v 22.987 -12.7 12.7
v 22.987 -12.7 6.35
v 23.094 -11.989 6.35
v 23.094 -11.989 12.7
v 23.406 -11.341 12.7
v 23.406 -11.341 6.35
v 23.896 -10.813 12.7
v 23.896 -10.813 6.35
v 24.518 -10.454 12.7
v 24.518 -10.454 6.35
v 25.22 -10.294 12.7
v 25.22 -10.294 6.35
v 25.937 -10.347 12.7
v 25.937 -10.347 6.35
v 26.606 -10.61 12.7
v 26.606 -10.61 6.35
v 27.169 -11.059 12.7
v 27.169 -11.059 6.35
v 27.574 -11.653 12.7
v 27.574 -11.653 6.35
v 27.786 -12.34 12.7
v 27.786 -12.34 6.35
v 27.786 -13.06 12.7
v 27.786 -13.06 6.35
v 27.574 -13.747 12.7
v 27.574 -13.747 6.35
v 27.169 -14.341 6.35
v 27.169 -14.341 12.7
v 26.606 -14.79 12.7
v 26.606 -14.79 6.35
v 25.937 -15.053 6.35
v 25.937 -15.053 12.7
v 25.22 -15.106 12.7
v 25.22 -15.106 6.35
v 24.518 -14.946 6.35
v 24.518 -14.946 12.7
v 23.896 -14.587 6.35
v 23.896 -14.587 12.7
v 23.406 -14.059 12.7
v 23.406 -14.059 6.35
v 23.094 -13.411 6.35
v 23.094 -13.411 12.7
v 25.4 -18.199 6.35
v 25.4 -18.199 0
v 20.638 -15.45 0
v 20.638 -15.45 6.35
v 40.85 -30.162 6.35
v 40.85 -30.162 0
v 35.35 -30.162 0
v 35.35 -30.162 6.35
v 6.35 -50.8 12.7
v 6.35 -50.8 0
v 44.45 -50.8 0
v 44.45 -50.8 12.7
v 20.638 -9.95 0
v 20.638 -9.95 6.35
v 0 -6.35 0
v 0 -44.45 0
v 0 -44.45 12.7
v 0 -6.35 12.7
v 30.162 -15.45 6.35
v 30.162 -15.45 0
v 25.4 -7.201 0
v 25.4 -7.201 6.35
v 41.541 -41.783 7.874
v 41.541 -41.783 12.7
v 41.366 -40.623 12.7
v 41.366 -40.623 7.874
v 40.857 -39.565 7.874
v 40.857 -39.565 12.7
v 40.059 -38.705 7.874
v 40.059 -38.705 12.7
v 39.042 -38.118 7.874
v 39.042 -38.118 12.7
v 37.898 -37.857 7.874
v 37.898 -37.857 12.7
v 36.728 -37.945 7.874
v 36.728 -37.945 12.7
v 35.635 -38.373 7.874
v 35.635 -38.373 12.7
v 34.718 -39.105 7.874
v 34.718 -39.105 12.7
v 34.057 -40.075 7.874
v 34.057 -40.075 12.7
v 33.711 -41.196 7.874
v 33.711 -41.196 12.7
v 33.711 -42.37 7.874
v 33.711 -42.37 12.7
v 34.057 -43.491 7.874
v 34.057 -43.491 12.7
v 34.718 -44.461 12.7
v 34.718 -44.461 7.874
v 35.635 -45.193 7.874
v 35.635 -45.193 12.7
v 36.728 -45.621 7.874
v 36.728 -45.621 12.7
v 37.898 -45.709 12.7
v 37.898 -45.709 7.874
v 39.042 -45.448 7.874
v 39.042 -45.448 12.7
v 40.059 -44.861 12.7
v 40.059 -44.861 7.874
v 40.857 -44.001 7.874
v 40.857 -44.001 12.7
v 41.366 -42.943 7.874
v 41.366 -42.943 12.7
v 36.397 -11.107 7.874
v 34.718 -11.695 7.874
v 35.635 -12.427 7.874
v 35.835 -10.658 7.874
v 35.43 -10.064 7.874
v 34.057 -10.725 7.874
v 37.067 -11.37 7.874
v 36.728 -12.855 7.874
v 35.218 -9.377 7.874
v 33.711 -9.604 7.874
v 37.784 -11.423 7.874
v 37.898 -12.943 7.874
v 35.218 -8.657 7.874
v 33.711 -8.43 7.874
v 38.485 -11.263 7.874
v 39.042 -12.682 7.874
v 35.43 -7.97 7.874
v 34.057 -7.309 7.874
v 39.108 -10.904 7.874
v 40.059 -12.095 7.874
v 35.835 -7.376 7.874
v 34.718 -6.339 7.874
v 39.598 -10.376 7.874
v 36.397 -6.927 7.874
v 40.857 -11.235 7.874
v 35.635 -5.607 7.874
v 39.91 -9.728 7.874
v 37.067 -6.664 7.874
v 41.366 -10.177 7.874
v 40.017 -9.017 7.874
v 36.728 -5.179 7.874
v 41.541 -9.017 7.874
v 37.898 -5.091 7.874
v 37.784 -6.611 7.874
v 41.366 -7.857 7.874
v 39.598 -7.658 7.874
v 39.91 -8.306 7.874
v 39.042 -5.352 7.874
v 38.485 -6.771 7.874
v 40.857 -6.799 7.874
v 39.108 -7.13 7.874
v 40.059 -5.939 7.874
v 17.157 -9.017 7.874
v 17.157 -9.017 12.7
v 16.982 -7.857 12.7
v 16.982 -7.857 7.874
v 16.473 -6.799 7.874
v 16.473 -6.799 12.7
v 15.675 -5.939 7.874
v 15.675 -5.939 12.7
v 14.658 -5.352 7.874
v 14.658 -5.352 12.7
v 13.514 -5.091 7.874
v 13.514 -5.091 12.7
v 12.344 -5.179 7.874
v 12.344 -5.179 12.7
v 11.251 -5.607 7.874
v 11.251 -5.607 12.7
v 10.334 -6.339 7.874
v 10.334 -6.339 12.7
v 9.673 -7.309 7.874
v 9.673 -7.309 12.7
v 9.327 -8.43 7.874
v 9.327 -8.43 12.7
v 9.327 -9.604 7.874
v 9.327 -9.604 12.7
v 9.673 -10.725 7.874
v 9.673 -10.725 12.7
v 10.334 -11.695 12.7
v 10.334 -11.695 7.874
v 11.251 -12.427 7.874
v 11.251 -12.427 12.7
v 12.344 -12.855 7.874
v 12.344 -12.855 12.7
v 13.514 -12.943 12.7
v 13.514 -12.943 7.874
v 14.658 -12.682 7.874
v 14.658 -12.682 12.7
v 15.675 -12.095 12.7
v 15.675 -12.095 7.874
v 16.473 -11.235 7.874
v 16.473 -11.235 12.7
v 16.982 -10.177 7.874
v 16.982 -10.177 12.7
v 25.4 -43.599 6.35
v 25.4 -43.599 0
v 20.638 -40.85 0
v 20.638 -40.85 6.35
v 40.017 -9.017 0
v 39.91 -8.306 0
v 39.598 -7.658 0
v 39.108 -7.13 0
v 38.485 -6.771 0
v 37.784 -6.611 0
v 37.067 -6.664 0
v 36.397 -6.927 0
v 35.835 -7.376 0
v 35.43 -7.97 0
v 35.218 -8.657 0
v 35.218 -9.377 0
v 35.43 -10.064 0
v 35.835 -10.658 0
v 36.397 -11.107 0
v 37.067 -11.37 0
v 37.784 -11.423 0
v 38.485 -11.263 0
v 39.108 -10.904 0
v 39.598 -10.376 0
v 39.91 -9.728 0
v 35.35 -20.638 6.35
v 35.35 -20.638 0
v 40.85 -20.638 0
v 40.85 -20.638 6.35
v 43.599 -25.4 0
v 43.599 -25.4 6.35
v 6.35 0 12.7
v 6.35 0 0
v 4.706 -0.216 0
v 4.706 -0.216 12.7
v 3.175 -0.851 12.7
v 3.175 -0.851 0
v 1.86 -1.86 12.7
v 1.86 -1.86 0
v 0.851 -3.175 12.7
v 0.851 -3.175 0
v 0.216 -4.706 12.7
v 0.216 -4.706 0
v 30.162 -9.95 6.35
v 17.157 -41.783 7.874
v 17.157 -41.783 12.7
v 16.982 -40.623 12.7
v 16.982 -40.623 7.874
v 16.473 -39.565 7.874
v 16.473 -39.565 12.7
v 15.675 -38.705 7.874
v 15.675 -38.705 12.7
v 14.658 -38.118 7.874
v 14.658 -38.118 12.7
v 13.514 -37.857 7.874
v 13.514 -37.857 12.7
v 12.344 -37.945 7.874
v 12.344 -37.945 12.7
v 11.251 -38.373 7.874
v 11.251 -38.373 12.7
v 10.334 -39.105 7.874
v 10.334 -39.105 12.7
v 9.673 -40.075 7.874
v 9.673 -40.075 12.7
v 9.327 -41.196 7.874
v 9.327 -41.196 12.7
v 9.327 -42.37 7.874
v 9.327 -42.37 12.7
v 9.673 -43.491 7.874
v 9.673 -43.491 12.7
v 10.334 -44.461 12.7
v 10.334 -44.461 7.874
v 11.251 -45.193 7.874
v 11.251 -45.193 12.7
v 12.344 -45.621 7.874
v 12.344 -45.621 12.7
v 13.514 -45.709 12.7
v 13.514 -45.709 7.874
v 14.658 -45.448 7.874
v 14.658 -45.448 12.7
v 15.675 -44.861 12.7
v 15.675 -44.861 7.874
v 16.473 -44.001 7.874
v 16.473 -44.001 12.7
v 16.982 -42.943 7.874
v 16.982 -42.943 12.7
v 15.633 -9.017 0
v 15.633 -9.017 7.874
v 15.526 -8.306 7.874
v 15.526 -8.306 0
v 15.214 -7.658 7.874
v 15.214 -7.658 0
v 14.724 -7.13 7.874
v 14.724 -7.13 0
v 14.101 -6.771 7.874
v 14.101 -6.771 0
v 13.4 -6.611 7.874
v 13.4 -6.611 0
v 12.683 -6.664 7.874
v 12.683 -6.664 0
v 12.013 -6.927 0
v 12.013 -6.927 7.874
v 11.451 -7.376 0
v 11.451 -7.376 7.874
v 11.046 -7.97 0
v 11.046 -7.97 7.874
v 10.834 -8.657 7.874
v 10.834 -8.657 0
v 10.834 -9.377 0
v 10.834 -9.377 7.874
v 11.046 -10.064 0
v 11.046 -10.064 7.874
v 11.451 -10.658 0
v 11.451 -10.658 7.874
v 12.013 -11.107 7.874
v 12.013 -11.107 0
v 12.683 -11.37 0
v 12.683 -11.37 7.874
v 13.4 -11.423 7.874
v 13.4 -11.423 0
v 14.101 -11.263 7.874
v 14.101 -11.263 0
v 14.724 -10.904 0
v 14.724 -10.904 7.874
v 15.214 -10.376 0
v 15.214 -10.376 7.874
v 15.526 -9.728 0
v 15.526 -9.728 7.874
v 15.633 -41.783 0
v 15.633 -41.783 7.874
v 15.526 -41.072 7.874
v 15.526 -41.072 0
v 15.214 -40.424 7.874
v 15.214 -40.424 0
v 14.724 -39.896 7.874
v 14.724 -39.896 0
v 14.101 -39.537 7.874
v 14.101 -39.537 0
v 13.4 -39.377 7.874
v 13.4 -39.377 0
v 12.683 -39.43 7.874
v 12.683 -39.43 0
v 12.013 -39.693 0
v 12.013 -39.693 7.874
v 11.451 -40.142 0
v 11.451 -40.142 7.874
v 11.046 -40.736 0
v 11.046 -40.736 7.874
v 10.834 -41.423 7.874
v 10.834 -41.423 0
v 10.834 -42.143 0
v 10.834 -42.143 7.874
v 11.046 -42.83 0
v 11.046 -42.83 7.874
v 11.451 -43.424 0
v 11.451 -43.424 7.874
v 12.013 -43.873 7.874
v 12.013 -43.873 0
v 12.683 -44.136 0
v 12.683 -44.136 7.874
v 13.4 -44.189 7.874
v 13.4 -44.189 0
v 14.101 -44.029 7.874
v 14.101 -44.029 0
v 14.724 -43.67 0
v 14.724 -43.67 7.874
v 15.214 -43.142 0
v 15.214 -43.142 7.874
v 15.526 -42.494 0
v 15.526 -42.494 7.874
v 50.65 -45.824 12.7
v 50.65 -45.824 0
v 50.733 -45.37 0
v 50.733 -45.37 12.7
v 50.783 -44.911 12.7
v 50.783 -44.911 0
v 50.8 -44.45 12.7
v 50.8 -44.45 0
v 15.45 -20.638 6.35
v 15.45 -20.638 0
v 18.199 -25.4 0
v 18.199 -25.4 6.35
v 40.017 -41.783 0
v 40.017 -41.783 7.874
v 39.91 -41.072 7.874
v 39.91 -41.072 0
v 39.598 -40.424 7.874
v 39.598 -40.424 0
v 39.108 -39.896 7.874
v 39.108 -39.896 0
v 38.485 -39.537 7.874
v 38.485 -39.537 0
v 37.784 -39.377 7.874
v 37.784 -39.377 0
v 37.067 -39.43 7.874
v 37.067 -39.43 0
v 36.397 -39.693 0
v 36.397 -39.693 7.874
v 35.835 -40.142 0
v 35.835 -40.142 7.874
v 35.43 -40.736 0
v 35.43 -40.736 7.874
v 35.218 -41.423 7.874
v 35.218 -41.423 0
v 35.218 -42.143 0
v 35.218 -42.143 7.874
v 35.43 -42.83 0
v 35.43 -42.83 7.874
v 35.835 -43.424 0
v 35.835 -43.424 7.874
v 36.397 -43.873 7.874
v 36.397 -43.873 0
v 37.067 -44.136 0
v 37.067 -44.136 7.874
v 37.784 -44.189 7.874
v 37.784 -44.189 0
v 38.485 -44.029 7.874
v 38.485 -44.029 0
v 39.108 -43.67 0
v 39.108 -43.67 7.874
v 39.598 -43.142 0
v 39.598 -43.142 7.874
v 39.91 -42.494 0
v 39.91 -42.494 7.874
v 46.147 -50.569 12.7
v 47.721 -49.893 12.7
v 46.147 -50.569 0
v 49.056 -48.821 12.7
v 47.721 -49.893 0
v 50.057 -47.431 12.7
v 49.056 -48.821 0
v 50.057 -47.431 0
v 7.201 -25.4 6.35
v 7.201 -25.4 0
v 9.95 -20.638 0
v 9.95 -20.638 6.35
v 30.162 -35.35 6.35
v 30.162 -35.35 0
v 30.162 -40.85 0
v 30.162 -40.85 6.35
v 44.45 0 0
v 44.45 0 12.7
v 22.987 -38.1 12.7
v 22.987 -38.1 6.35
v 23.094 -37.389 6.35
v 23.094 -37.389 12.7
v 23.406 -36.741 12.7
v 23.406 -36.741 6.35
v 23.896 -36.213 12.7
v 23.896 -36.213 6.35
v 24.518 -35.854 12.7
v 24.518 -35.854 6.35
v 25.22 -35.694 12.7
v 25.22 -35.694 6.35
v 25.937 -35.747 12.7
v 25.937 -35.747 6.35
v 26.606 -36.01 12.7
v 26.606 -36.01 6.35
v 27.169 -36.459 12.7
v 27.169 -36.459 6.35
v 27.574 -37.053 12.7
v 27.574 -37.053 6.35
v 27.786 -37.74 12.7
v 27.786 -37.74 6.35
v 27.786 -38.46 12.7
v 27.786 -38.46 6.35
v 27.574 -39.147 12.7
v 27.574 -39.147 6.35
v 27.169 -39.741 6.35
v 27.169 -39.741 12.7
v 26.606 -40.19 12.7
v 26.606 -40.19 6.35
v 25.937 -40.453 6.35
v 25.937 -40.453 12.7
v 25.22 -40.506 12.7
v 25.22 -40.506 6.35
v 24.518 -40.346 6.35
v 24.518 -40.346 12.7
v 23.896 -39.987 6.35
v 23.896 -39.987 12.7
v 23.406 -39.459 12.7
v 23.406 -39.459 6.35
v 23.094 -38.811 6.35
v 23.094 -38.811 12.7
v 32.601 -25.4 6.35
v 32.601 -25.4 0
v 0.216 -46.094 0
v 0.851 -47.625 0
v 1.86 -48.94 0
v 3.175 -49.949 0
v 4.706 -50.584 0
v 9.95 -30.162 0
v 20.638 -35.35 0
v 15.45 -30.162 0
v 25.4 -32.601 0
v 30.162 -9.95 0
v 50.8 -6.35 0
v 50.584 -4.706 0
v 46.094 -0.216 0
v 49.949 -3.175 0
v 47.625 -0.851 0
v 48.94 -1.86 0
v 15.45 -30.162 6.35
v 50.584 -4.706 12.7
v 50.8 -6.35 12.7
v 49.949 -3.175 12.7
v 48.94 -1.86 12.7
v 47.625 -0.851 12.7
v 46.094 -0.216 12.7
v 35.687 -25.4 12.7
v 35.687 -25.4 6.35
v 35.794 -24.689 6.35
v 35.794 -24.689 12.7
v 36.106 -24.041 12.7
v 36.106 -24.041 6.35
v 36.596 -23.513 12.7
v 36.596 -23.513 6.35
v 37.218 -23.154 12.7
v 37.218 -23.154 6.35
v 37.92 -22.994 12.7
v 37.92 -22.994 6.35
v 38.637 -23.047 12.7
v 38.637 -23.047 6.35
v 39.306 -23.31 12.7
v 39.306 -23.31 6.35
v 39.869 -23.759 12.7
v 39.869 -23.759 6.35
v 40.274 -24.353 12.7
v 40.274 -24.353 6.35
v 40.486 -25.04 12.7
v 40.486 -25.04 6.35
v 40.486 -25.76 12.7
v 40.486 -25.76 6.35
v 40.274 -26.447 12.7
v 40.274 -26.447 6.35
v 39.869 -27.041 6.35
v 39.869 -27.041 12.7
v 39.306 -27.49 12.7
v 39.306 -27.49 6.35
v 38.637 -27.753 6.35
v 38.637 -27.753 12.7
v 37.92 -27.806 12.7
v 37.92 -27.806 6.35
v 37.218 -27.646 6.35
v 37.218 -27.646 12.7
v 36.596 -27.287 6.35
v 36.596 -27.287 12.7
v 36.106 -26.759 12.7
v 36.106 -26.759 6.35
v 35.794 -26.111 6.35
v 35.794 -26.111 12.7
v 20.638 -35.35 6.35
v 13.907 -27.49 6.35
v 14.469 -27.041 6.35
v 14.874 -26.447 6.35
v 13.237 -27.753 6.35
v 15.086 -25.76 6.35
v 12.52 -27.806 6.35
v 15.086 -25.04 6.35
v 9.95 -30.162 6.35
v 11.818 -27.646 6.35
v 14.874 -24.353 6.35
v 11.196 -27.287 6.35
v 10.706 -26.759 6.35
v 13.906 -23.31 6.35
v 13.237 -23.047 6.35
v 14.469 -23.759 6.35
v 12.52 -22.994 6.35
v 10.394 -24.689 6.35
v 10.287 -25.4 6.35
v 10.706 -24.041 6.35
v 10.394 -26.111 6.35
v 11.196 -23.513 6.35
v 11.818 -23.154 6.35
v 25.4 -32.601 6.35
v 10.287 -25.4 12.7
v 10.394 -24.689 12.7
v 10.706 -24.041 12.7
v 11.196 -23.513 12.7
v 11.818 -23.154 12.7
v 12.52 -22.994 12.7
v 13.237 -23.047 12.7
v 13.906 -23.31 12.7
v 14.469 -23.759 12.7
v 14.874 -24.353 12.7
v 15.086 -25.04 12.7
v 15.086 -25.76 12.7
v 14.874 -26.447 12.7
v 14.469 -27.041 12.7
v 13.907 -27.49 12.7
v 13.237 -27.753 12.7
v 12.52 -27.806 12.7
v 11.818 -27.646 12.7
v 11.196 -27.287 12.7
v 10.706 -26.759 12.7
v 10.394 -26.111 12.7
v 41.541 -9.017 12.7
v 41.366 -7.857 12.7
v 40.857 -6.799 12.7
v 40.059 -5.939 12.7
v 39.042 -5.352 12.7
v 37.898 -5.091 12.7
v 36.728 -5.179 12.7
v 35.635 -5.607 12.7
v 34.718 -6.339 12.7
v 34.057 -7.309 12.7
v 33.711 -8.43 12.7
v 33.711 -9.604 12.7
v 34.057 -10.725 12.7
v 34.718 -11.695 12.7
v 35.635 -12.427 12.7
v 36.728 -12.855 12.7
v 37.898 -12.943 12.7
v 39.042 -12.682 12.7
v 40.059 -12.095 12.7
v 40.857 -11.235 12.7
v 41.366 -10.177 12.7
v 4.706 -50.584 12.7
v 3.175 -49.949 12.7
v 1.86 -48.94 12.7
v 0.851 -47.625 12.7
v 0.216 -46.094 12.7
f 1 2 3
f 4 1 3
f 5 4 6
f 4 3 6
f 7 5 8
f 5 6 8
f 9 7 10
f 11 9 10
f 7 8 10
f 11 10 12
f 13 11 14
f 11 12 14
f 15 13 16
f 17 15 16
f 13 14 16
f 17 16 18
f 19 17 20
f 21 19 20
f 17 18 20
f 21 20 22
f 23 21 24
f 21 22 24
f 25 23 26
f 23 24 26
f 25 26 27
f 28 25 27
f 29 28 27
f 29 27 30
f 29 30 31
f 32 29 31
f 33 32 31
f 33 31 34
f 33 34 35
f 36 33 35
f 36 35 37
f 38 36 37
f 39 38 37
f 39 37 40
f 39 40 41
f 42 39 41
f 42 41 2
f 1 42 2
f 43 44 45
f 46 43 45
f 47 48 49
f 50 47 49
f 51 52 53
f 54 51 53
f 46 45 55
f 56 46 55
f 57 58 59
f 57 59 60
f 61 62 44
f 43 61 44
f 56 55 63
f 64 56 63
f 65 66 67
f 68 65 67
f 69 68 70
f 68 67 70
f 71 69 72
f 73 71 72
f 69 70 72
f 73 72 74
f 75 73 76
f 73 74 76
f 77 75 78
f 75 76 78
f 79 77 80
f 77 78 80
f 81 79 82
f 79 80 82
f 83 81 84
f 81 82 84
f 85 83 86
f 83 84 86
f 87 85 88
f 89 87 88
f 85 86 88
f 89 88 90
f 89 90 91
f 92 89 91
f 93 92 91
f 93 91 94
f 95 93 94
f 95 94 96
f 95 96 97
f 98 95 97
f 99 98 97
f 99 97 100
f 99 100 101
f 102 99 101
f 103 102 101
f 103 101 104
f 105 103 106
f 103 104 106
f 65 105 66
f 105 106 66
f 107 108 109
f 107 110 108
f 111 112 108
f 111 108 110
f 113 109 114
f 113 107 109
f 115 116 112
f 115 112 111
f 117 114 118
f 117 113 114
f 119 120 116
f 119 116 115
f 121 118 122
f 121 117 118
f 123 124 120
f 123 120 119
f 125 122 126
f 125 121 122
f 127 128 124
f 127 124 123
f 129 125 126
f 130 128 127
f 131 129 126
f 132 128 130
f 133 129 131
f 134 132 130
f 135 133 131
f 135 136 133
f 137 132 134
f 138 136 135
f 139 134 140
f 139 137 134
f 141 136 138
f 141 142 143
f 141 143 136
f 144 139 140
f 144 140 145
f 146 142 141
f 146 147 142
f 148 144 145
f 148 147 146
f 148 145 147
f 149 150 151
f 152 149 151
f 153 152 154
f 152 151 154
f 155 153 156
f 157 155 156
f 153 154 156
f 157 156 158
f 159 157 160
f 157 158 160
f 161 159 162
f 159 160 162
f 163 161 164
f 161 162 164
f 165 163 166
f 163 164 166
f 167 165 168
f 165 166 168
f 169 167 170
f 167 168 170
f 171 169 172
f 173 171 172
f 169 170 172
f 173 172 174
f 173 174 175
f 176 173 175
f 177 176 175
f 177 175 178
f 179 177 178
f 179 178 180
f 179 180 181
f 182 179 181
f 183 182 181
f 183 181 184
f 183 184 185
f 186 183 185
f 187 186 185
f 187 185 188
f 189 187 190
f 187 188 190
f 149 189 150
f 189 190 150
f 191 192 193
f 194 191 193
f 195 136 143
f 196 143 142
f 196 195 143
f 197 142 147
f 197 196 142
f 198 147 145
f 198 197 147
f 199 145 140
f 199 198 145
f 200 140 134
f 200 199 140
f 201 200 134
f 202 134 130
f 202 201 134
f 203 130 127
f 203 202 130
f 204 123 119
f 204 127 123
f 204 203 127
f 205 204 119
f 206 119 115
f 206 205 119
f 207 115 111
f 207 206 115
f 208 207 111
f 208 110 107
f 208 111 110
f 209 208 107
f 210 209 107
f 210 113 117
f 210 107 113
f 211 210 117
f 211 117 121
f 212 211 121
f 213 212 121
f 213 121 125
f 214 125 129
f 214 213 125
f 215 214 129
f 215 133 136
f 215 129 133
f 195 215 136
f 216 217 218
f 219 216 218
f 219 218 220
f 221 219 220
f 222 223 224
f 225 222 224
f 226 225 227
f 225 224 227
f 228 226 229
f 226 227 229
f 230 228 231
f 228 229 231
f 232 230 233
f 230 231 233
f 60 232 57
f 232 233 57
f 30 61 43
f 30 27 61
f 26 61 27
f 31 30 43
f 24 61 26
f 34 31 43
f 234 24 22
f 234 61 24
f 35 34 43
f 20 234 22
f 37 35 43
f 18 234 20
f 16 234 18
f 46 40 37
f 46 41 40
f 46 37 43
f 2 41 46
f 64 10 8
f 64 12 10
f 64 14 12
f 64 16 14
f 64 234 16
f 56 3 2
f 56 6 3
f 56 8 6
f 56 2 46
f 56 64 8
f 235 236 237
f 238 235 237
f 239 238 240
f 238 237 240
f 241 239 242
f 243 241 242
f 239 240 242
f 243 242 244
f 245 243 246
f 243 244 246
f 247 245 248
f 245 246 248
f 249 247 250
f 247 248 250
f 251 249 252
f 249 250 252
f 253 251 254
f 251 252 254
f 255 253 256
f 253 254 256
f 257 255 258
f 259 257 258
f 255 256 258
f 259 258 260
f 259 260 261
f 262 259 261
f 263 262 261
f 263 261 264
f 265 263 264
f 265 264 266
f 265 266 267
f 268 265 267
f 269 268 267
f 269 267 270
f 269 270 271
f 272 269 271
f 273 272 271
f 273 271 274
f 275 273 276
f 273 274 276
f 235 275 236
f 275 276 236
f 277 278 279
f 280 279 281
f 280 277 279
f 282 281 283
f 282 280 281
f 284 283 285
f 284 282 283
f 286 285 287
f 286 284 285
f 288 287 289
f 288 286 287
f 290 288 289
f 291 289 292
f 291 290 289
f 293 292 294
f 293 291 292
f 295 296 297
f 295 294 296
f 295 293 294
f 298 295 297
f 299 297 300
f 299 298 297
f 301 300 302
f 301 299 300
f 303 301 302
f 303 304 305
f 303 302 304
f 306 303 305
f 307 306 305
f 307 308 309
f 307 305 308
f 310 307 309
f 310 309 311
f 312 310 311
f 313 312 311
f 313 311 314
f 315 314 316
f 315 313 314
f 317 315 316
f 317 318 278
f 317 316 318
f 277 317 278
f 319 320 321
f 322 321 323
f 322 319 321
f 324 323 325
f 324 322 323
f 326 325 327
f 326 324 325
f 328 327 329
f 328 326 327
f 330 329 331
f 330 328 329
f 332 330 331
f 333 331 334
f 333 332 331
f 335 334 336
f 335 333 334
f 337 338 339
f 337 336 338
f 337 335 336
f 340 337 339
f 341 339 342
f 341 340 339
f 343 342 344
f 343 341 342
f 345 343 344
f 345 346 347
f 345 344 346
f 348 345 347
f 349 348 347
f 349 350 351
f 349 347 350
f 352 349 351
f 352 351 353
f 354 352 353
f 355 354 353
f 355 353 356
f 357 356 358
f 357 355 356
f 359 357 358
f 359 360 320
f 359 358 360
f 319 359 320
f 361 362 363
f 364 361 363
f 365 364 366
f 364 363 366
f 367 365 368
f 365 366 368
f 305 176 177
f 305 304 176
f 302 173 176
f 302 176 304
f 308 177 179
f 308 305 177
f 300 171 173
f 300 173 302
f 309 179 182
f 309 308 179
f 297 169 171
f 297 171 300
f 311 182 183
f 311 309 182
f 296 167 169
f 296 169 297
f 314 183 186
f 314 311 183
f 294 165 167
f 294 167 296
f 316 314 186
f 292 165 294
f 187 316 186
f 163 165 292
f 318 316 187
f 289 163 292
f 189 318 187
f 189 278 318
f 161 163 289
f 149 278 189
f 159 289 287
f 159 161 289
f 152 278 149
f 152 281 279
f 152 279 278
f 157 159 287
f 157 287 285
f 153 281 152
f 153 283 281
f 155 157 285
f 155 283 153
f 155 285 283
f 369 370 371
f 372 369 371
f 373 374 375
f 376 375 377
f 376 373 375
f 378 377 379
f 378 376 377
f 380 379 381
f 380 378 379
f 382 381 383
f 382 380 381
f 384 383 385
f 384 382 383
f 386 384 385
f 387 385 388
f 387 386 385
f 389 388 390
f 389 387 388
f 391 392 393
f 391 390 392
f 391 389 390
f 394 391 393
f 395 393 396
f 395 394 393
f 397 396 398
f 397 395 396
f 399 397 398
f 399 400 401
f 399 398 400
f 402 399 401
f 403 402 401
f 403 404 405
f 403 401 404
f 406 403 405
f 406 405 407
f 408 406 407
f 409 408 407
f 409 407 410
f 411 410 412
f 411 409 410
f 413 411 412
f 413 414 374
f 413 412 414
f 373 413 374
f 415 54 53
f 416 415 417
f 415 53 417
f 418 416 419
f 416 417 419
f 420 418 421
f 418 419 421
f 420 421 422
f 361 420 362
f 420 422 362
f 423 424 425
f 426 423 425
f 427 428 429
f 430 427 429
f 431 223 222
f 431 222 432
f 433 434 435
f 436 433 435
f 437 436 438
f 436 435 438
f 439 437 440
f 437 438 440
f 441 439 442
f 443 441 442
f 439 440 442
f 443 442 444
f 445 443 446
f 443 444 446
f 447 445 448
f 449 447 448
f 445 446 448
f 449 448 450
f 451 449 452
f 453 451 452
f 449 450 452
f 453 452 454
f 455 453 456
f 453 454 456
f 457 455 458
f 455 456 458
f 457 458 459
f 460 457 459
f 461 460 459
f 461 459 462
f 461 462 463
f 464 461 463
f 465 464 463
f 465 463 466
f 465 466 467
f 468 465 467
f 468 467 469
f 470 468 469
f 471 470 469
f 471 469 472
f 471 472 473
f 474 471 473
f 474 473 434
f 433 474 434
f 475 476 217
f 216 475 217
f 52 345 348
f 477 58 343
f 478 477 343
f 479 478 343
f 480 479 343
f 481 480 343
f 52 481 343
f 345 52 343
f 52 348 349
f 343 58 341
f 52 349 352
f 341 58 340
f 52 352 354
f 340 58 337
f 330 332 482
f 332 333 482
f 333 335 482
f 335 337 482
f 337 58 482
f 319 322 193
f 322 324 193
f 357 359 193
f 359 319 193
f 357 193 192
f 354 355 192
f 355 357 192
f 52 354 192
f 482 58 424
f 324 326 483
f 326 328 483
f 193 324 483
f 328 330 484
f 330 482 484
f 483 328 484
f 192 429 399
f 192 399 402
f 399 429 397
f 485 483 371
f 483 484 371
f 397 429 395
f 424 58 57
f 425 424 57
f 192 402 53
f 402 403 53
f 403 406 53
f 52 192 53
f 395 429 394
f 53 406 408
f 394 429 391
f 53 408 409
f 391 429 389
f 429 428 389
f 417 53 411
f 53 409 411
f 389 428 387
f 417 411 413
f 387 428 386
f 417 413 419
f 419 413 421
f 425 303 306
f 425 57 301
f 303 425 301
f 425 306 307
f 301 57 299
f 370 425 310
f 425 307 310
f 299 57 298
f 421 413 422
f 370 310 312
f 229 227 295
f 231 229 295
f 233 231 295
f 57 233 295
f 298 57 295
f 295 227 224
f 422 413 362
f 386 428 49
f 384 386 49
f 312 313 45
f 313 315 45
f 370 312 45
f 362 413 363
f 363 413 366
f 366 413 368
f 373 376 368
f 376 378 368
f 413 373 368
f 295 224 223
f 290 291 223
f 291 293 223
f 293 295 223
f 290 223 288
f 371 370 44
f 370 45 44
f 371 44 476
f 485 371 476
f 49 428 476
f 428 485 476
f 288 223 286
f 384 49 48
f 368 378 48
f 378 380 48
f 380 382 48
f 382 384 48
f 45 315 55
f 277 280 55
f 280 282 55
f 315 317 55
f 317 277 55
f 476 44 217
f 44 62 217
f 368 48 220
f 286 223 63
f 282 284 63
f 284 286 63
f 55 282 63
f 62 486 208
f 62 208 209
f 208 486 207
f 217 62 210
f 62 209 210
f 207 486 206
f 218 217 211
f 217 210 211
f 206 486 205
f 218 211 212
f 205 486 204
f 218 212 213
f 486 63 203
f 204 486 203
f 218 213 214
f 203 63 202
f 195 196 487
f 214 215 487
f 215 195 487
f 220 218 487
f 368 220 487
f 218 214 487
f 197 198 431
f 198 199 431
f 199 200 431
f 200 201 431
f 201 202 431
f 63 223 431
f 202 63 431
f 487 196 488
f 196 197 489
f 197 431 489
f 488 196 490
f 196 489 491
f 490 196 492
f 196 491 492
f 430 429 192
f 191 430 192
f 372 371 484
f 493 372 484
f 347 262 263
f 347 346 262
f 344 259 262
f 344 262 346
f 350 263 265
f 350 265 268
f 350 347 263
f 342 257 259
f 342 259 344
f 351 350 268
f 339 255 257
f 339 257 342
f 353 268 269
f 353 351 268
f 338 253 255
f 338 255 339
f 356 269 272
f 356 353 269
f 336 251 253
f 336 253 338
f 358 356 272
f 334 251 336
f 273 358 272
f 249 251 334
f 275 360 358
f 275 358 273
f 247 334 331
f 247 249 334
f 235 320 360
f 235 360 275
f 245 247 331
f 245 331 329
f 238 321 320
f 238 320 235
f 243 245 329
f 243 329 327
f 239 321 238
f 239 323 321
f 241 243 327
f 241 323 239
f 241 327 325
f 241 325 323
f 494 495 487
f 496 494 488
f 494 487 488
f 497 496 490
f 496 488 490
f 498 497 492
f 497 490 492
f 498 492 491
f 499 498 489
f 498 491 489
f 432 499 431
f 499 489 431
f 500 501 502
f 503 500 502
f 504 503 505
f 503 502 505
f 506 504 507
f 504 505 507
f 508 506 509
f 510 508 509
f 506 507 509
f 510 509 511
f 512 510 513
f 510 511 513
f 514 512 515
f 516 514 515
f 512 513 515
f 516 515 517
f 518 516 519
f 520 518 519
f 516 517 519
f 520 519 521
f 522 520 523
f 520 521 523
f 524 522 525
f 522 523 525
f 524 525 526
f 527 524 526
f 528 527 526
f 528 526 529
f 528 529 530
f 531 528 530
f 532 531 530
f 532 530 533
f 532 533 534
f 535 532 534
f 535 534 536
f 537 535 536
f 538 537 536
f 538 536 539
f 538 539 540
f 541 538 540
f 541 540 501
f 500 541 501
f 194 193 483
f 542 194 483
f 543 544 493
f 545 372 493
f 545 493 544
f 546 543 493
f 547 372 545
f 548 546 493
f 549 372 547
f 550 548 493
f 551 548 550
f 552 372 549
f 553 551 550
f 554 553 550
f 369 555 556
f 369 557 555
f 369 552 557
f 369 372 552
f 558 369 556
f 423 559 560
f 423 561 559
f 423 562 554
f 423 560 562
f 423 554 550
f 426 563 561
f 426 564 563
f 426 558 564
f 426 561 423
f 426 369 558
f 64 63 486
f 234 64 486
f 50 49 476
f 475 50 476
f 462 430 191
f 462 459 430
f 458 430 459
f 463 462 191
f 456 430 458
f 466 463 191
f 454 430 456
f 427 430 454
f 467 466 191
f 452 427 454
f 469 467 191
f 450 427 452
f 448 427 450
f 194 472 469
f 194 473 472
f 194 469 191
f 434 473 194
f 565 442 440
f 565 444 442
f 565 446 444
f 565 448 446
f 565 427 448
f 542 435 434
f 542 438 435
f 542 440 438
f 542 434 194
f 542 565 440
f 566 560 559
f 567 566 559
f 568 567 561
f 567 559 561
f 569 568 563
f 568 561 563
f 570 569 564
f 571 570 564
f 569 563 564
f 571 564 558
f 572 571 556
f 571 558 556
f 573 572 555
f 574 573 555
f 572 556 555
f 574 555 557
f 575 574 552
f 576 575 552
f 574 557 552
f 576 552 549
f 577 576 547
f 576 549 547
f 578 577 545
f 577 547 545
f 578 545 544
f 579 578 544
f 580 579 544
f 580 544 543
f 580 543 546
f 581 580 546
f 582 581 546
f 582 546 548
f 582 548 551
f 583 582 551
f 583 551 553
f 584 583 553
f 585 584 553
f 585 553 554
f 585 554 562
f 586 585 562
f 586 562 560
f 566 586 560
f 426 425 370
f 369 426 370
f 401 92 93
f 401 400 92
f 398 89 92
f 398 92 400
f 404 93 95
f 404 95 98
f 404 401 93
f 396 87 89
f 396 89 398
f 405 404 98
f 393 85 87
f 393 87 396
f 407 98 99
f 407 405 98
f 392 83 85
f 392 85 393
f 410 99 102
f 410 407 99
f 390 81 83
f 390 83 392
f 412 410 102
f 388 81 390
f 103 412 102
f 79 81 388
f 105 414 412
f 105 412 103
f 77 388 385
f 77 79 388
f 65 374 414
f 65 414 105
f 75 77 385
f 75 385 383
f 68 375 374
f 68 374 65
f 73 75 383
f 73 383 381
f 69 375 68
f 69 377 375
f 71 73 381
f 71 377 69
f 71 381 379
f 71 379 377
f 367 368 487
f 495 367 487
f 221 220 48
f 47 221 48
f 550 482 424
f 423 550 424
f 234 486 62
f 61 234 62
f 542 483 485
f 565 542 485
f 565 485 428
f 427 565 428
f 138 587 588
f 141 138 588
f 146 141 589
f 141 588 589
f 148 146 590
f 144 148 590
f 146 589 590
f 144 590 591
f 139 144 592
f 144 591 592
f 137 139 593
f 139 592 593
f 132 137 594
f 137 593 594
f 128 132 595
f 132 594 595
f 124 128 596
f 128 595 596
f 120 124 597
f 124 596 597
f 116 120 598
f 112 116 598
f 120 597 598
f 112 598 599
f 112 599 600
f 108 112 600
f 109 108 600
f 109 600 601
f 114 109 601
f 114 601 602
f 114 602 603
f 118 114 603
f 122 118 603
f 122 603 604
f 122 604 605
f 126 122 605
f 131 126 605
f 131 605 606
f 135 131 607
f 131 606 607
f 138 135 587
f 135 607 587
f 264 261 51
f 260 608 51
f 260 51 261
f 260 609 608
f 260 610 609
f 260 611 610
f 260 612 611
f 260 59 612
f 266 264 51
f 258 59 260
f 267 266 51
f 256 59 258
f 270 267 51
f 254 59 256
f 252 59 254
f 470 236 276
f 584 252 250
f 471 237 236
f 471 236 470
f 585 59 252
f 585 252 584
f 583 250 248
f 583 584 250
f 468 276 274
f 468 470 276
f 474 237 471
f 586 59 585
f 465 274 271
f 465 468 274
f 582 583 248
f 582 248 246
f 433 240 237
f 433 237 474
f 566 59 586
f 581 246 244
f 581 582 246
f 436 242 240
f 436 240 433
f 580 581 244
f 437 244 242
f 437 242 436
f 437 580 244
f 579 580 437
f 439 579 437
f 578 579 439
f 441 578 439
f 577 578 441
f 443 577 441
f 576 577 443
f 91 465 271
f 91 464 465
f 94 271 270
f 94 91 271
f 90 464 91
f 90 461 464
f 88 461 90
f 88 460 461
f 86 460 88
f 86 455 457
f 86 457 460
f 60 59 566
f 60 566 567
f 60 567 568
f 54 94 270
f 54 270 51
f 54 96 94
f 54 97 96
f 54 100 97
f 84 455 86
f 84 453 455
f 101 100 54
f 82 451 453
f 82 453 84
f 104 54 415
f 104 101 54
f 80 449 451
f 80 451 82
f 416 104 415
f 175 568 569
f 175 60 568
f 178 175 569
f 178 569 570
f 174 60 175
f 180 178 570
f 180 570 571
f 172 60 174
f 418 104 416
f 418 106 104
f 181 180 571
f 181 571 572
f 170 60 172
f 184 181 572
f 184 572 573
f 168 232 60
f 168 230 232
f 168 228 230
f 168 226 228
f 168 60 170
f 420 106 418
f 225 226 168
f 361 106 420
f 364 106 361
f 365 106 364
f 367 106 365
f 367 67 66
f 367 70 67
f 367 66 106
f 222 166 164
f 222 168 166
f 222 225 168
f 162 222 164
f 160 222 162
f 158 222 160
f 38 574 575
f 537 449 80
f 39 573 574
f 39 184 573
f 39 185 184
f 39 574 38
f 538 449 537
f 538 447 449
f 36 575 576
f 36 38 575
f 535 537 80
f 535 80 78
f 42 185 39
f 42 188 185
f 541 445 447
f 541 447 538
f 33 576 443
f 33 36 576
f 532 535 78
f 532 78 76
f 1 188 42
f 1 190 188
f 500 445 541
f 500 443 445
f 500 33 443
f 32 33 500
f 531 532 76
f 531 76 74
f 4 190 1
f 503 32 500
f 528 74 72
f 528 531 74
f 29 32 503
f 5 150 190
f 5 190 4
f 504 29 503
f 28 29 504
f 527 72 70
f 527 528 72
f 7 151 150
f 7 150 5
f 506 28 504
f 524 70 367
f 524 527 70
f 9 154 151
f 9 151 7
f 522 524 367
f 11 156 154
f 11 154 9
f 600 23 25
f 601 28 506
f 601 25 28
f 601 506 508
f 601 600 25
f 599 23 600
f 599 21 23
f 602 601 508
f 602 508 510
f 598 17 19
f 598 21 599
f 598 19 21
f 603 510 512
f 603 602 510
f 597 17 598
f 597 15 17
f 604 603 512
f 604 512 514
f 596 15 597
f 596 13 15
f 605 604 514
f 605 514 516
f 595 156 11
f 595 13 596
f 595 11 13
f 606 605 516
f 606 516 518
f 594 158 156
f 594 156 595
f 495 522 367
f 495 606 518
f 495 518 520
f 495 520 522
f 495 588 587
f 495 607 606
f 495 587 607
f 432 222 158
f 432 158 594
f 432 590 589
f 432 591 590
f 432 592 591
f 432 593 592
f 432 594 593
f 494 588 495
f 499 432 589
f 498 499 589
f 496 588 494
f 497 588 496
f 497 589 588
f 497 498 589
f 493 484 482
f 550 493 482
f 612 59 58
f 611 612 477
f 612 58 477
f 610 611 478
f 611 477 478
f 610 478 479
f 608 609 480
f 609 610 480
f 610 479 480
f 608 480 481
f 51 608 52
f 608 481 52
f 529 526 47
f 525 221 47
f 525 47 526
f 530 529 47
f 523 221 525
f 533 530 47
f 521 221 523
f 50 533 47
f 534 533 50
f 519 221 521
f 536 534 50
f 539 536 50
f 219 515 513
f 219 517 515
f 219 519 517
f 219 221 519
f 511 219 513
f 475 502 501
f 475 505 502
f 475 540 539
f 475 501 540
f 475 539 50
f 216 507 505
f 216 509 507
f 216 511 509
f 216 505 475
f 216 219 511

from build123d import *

# Parameters (mm, degrees)
SKETCH1_W           = 50.8
SKETCH1_H           = 50.8
SKETCH1_R           = 2.413
BOSS_EXTRUDE1_DEPTH = 12.7
SKETCH2_R           = 2.413
CUT_EXTRUDE2_DEPTH  = 12.7
SKETCH7_R           = 2.413
CUT_EXTRUDE5_DEPTH  = 6.35
CUT_EXTRUDE6_DEPTH  = 73.955945611
SKETCH13_R          = 3.937
CUT_EXTRUDE7_DEPTH  = 4.826


with BuildPart() as part:
    # Sketch1 → Boss-Extrude1 (new body)
    with BuildSketch(Plane.XY):
        with Locations((25.4, -25.4)):
            Rectangle(SKETCH1_W, SKETCH1_H)
        with Locations((13.219909227, -9.017)):
            Circle(SKETCH1_R, mode=Mode.SUBTRACT)
        with Locations((37.603909227, -9.017)):
            Circle(SKETCH1_R, mode=Mode.SUBTRACT)
        with Locations((13.219909227, -41.783)):
            Circle(SKETCH1_R, mode=Mode.SUBTRACT)
        with Locations((37.603909227, -41.783)):
            Circle(SKETCH1_R, mode=Mode.SUBTRACT)
    extrude(amount=BOSS_EXTRUDE1_DEPTH)

    # Sketch2 → Cut-Extrude2 (cut)
    with BuildSketch(Plane(origin=(0, 0, 0), x_dir=(-1, 0, 0), z_dir=(0, 0, -1))):
        with Locations((-38.1, -25.4)):
            Circle(SKETCH2_R)
        with Locations((-25.4, -12.7)):
            Circle(SKETCH2_R)
        with Locations((-25.4, -38.1)):
            Circle(SKETCH2_R)
        with Locations((-12.7, -25.4)):
            Circle(SKETCH2_R)
    extrude(amount=-CUT_EXTRUDE2_DEPTH, mode=Mode.SUBTRACT)

    # Sketch7 → Cut-Extrude5 (cut)
    # profile 1 of 4: a face of its own
    with BuildSketch(Plane(origin=(0, 0, 0), x_dir=(-1, 0, 0), z_dir=(0, 0, -1))):
        Polygon((-20.6375, -40.849630657), (-20.6375, -35.350369343), (-25.4, -32.600738686), (-30.1625, -35.350369343), (-30.1625, -40.849630657), (-25.4, -43.599261314), align=None)
        with Locations((-25.4, -38.1)):
            Circle(SKETCH7_R, mode=Mode.SUBTRACT)
    # profile 2 of 4: a face of its own
    with BuildSketch(Plane(origin=(0, 0, 0), x_dir=(-1, 0, 0), z_dir=(0, 0, -1))):
        Polygon((-40.849630657, -30.1625), (-35.350369343, -30.1625), (-32.600738686, -25.4), (-35.350369343, -20.6375), (-40.849630657, -20.6375), (-43.599261314, -25.4), align=None)
        with Locations((-38.1, -25.4)):
            Circle(SKETCH7_R, mode=Mode.SUBTRACT)
    # profile 3 of 4: a face of its own
    with BuildSketch(Plane(origin=(0, 0, 0), x_dir=(-1, 0, 0), z_dir=(0, 0, -1))):
        Polygon((-9.950369343, -20.6375), (-15.449630657, -20.6375), (-18.199261314, -25.4), (-15.449630657, -30.1625), (-9.950369343, -30.1625), (-7.200738686, -25.4), align=None)
        with Locations((-12.7, -25.4)):
            Circle(SKETCH7_R, mode=Mode.SUBTRACT)
    # profile 4 of 4: a face of its own
    with BuildSketch(Plane(origin=(0, 0, 0), x_dir=(-1, 0, 0), z_dir=(0, 0, -1))):
        Polygon((-30.1625, -9.950369343), (-30.1625, -15.449630657), (-25.4, -18.199261314), (-20.6375, -15.449630657), (-20.6375, -9.950369343), (-25.4, -7.200738686), align=None)
        with Locations((-25.4, -12.7)):
            Circle(SKETCH7_R, mode=Mode.SUBTRACT)
    extrude(amount=-CUT_EXTRUDE5_DEPTH, mode=Mode.SUBTRACT)

    # Sketch10 → Cut-Extrude6 (cut, through all)
    with BuildSketch(Plane(origin=(0, 0, 0), x_dir=(-1, 0, 0), z_dir=(0, 0, -1))):
        with BuildLine():
            ThreePointArc((-50.8, -6.35), (-48.940128061, -1.859871939), (-44.45, 0))
            Line((-44.45, 0), (-50.8, 0))
            Line((-50.8, 0), (-50.8, -6.35))
        make_face()
        with BuildLine():
            Line((0, 0), (-6.35, 0))
            ThreePointArc((-6.35, 0), (-1.859871939, -1.859871939), (0, -6.35))
            Line((0, -6.35), (0, 0))
        make_face()
        with BuildLine():
            Line((0, -50.8), (0, -44.45))
            ThreePointArc((0, -44.45), (-1.859871939, -48.940128061), (-6.35, -50.8))
            Line((-6.35, -50.8), (0, -50.8))
        make_face()
        with BuildLine():
            ThreePointArc((-50.649504621, -45.824278884), (-50.762264029, -45.141247299), (-50.8, -44.45))
            Line((-50.8, -44.45), (-50.8, -50.8))
            Line((-50.8, -50.8), (-44.45, -50.8))
            ThreePointArc((-44.45, -50.8), (-48.424659047, -49.402230352), (-50.649504621, -45.824278884))
        make_face()
    extrude(amount=-CUT_EXTRUDE6_DEPTH, mode=Mode.SUBTRACT)

    # Sketch13 → Cut-Extrude7 (cut)
    with BuildSketch(Plane.XY.offset(12.7)):
        with Locations((37.603909227, -41.783)):
            Circle(SKETCH13_R)
        with Locations((13.219909227, -41.783)):
            Circle(SKETCH13_R)
        with Locations((37.603909227, -9.017)):
            Circle(SKETCH13_R)
        with Locations((13.219909227, -9.017)):
            Circle(SKETCH13_R)
    extrude(amount=-CUT_EXTRUDE7_DEPTH, mode=Mode.SUBTRACT)


solid = part.part
